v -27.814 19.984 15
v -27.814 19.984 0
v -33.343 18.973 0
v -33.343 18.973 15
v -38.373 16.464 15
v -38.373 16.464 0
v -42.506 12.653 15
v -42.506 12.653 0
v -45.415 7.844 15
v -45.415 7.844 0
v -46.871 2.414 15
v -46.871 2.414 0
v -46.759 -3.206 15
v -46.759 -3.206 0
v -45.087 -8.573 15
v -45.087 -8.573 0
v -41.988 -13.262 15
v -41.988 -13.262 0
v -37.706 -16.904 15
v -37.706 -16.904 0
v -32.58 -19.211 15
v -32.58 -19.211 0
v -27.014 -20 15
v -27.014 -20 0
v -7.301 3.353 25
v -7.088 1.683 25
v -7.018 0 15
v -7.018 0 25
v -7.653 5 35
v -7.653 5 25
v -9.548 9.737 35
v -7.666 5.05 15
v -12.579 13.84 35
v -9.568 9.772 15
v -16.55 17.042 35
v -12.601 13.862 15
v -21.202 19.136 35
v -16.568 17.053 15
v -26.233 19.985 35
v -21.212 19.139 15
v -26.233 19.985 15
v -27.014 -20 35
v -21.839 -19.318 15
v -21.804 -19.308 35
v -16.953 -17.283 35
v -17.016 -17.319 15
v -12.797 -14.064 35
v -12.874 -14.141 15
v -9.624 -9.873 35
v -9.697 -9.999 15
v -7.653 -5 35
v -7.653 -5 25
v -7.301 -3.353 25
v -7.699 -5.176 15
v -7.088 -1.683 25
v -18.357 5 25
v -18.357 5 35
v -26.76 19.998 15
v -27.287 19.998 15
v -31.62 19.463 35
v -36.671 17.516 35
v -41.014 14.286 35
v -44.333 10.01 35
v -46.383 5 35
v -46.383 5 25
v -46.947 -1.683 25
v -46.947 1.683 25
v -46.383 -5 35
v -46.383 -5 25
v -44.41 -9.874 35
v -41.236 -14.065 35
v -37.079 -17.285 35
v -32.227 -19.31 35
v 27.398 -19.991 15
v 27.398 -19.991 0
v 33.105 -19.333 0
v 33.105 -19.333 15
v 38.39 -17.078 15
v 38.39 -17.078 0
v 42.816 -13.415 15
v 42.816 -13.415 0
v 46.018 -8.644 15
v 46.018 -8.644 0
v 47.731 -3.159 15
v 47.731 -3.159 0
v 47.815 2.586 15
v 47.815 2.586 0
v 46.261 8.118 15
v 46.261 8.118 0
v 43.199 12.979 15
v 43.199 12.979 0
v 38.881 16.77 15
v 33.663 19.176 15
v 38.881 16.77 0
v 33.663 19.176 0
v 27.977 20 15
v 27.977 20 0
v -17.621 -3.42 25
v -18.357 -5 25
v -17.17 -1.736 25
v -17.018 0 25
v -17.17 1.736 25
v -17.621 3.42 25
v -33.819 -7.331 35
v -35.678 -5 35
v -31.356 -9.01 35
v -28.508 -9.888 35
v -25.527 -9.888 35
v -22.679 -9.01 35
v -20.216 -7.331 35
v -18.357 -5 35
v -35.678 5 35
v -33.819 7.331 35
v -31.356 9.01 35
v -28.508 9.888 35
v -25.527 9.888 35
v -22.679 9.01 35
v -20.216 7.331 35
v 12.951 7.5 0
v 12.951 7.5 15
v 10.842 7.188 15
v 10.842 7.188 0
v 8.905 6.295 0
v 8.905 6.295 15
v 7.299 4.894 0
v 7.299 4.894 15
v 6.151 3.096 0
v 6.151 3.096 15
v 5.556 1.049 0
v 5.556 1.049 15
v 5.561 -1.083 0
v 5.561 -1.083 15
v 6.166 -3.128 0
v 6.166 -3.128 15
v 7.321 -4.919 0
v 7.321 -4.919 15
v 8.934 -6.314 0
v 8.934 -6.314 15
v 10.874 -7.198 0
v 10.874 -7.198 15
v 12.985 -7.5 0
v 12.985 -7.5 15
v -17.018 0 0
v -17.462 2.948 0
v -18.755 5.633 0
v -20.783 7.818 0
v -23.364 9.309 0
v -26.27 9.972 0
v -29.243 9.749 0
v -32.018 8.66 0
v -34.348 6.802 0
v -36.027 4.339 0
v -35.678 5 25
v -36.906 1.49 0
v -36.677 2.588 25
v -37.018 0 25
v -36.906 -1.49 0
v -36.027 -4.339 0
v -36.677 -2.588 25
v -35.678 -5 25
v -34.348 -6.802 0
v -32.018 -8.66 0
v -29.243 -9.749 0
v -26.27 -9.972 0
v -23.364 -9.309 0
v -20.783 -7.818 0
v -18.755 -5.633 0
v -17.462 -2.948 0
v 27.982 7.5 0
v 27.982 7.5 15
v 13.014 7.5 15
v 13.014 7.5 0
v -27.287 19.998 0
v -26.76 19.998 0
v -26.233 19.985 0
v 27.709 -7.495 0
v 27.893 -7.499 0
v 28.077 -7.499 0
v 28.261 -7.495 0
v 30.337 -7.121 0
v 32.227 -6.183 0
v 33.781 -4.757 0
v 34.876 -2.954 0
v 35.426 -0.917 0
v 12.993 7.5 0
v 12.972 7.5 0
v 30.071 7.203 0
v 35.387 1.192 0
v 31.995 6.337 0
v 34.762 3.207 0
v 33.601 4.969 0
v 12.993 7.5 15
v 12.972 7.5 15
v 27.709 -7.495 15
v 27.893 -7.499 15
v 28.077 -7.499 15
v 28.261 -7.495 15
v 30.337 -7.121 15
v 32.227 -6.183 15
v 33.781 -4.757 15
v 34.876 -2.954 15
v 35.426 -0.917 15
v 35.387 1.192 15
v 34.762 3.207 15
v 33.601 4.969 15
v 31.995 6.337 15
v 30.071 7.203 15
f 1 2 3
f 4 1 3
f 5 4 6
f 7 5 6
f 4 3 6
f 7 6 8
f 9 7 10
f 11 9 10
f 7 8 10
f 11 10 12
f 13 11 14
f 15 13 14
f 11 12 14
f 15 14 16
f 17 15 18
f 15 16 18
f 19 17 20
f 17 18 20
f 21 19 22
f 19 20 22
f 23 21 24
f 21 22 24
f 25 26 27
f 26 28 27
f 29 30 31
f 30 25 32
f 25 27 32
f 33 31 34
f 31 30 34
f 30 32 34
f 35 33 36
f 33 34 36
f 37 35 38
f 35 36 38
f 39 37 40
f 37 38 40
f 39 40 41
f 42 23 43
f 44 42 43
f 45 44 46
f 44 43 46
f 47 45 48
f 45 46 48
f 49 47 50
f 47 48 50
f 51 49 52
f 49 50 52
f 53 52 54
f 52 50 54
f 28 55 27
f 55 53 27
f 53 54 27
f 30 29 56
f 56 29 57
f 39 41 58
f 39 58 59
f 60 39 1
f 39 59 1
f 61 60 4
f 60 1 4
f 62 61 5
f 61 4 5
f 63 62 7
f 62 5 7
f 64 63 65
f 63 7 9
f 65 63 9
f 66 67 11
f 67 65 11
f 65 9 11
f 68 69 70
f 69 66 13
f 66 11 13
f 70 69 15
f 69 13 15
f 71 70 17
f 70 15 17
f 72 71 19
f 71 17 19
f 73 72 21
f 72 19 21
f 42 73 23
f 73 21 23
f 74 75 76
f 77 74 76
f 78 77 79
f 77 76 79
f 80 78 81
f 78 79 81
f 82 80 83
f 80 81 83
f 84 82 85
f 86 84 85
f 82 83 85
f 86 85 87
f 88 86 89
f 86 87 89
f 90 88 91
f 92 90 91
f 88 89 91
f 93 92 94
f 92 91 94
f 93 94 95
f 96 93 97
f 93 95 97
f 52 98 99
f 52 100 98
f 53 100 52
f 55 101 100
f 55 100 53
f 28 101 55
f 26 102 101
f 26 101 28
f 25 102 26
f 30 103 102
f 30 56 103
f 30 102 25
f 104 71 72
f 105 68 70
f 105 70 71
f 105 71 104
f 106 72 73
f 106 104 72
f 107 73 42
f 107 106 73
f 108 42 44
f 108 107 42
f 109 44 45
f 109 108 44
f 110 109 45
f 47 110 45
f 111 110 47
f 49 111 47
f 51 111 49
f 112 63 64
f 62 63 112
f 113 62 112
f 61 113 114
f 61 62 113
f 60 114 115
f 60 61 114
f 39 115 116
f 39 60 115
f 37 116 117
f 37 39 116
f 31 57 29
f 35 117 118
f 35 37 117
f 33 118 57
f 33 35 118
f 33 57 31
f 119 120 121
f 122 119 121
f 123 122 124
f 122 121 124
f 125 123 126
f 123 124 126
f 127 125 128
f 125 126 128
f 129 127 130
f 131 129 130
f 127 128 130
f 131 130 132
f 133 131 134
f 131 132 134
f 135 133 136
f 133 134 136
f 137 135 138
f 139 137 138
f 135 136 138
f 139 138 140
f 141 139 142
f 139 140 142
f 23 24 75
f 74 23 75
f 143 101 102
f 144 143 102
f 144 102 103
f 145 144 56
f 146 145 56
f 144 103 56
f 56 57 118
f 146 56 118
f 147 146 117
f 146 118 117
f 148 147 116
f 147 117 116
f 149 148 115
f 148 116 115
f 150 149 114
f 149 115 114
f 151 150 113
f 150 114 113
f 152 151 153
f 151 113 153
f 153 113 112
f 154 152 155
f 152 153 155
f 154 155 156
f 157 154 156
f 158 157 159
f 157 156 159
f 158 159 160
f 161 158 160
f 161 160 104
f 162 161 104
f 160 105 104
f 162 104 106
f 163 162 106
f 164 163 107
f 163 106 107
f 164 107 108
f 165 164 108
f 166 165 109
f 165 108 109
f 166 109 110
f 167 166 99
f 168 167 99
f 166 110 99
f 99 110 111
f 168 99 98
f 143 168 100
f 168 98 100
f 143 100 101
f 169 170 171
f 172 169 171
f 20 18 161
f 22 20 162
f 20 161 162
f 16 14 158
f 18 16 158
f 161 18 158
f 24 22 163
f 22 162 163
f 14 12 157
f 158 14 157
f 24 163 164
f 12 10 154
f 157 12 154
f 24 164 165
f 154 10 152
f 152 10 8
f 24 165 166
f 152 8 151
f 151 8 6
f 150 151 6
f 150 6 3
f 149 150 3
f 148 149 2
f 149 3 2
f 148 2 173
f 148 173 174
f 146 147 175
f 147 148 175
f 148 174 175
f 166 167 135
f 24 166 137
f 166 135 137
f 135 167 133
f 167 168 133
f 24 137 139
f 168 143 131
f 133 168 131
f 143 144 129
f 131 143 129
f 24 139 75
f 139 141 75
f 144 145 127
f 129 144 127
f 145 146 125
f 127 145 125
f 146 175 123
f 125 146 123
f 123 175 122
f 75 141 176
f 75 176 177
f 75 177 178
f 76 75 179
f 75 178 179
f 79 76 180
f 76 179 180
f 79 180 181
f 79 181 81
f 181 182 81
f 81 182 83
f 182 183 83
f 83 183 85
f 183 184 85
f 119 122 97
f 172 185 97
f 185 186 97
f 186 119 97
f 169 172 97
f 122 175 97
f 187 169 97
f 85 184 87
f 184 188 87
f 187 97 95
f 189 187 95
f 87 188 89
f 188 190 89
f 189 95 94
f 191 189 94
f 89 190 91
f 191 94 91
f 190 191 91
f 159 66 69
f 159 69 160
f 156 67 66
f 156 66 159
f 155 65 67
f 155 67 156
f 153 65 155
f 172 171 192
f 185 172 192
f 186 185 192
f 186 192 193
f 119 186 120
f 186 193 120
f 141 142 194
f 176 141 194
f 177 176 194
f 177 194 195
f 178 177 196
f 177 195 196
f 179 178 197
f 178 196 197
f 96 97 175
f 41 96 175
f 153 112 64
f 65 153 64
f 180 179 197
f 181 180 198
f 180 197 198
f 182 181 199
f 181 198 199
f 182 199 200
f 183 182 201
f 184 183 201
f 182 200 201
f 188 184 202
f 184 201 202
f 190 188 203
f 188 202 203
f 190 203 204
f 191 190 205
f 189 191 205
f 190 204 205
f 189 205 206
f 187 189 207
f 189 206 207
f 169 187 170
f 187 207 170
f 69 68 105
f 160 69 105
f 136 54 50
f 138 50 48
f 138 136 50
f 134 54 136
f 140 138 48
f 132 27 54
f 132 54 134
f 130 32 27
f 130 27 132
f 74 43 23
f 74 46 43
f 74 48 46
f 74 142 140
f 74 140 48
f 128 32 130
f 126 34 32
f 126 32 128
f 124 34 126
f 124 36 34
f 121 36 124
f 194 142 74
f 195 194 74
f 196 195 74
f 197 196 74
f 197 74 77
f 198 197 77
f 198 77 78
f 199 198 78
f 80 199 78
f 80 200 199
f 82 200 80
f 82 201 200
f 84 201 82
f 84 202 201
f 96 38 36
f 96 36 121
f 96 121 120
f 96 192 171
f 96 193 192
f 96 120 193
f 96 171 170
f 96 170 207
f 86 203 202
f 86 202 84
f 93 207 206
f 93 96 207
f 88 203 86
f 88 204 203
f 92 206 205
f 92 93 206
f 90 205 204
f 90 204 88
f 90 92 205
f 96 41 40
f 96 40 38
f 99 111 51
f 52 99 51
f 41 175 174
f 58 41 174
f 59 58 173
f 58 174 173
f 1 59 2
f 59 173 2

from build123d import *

# Parameters (mm, degrees)
F1_DEPTH = 15
F3_DEPTH = 20
F4_R     = 10
F5_DEPTH = 60.8
F7_DEPTH = 10
F9_DEPTH = 33.1


with BuildPart() as f1:
    # F0 (on Top) → F1 (new body)
    with BuildSketch(Plane.XY):
        with BuildLine():
            Line((-27.8139331382, 19.9841398605), (-26.2326190666, 19.9845893727))
            ThreePointArc((-26.2326190666, 19.9845893727), (-27.0232805468, 19.9999991919), (-27.8139331382, 19.9841398605))
        make_face()
        with BuildLine():
            Line((27.9767194532, 19.9999991919), (-26.2326190666, 19.9845893727))
            Line((-26.2326190666, 19.9845893727), (-27.8139331382, 19.9841398605))
            ThreePointArc((-27.8139331382, 19.9841398605), (-47.0135984526, -0.399819681), (-27.0144510727, -19.9999997529))
            Line((-27.0144510727, -19.9999997529), (27.397513264, -19.9914457192))
            ThreePointArc((27.397513264, -19.9914457192), (47.9803074375, -0.2896346714), (27.9767194532, 19.9999991919))
        make_face()
    extrude(amount=F1_DEPTH)

    # F2 (on face) → F3 (join)
    with BuildSketch(Plane.XY.offset(15)):
        with BuildLine():
            ThreePointArc((-27.0144510727, -19.9999997529), (-12.8743480331, -14.1410239467), (-7.0175952464, 0))
            ThreePointArc((-7.0175952464, 0), (-12.600599658, 13.8618266546), (-26.2326190666, 19.9845893727))
            ThreePointArc((-26.2326190666, 19.9845893727), (-47.0137730139, 0.3909919326), (-27.0144510727, -19.9999997529))
        make_face()
    extrude(amount=F3_DEPTH)

    # F4 (on face) → F5 (cut)
    with BuildSketch(Plane.XY.offset(35)):
        with Locations((-27.0175952464, 0)):
            Circle(F4_R)
    extrude(amount=-F5_DEPTH, mode=Mode.SUBTRACT)

    # F6 (on face) → F7 (cut)
    with BuildSketch(Plane.XY.offset(35)):
        with BuildLine():
            Line((-46.3825119775, 5), (-53.2571481913, 5))
            Line((-53.2571481913, 5), (-53.2571481913, -5))
            Line((-53.2571481913, -5), (-46.3825119775, -5))
            ThreePointArc((-46.3825119775, -5), (-47.0175952464, 0), (-46.3825119775, 5))
        make_face()
        with BuildLine():
            Line((6.7428518087, 5), (-7.6526785154, 5))
            ThreePointArc((-7.6526785154, 5), (-7.1770013211, 2.5200858497), (-7.0175952464, 0))
            ThreePointArc((-7.0175952464, 0), (-7.1770013211, -2.5200858497), (-7.6526785154, -5))
            Line((-7.6526785154, -5), (6.7428518087, -5))
            Line((6.7428518087, -5), (6.7428518087, 5))
        make_face()
        with BuildLine():
            Line((-35.6778492843, 5), (-46.3825119775, 5))
            ThreePointArc((-46.3825119775, 5), (-47.0175952464, 0), (-46.3825119775, -5))
            Line((-46.3825119775, -5), (-35.6778492843, -5))
            ThreePointArc((-35.6778492843, -5), (-37.0175952464, 0), (-35.6778492843, 5))
        make_face()
        with BuildLine():
            Line((-18.3573412086, 5), (-35.6778492843, 5))
            ThreePointArc((-35.6778492843, 5), (-37.0175952464, 0), (-35.6778492843, -5))
            Line((-35.6778492843, -5), (-18.3573412086, -5))
            ThreePointArc((-18.3573412086, -5), (-17.3583369835, -2.588190451), (-17.0175952464, 0))
            ThreePointArc((-17.0175952464, 0), (-17.3583369835, 2.588190451), (-18.3573412086, 5))
        make_face()
        with BuildLine():
            ThreePointArc((-7.0175952464, 0), (-7.1770013211, 2.5200858497), (-7.6526785154, 5))
            Line((-7.6526785154, 5), (-18.3573412086, 5))
            ThreePointArc((-18.3573412086, 5), (-17.3583369835, 2.588190451), (-17.0175952464, 0))
            ThreePointArc((-17.0175952464, 0), (-17.3583369835, -2.588190451), (-18.3573412086, -5))
            Line((-18.3573412086, -5), (-7.6526785154, -5))
            ThreePointArc((-7.6526785154, -5), (-7.1770013211, -2.5200858497), (-7.0175952464, 0))
        make_face()
    extrude(amount=-F7_DEPTH, mode=Mode.SUBTRACT)

    # F8 (on face) → F9 (cut)
    with BuildSketch(Plane.XY.offset(15)):
        with BuildLine():
            Line((28.2606767434, -7.4948358688), (27.7091998301, -7.4950222861))
            ThreePointArc((27.7091998301, -7.4950222861), (27.9849400007, -7.4999995715), (28.2606767434, -7.4948358688))
        make_face()
        with BuildLine():
            Line((12.9849400007, -7.4999995715), (27.7091998301, -7.4950222861))
            Line((27.7091998301, -7.4950222861), (28.2606767434, -7.4948358688))
            ThreePointArc((28.2606767434, -7.4948358688), (35.4811133003, 0.1391766201), (27.9823714109, 7.5))
            Line((27.9823714109, 7.5), (13.0139985431, 7.4999334552))
            ThreePointArc((13.0139985431, 7.4999334552), (12.9823714109, 7.4999999999), (12.9507442793, 7.499933174))
            ThreePointArc((12.9507442793, 7.499933174), (5.4824242428, -0.017097893), (12.9849400007, -7.4999995715))
        make_face()
    extrude(amount=-F9_DEPTH, mode=Mode.SUBTRACT)


solid = f1.part
